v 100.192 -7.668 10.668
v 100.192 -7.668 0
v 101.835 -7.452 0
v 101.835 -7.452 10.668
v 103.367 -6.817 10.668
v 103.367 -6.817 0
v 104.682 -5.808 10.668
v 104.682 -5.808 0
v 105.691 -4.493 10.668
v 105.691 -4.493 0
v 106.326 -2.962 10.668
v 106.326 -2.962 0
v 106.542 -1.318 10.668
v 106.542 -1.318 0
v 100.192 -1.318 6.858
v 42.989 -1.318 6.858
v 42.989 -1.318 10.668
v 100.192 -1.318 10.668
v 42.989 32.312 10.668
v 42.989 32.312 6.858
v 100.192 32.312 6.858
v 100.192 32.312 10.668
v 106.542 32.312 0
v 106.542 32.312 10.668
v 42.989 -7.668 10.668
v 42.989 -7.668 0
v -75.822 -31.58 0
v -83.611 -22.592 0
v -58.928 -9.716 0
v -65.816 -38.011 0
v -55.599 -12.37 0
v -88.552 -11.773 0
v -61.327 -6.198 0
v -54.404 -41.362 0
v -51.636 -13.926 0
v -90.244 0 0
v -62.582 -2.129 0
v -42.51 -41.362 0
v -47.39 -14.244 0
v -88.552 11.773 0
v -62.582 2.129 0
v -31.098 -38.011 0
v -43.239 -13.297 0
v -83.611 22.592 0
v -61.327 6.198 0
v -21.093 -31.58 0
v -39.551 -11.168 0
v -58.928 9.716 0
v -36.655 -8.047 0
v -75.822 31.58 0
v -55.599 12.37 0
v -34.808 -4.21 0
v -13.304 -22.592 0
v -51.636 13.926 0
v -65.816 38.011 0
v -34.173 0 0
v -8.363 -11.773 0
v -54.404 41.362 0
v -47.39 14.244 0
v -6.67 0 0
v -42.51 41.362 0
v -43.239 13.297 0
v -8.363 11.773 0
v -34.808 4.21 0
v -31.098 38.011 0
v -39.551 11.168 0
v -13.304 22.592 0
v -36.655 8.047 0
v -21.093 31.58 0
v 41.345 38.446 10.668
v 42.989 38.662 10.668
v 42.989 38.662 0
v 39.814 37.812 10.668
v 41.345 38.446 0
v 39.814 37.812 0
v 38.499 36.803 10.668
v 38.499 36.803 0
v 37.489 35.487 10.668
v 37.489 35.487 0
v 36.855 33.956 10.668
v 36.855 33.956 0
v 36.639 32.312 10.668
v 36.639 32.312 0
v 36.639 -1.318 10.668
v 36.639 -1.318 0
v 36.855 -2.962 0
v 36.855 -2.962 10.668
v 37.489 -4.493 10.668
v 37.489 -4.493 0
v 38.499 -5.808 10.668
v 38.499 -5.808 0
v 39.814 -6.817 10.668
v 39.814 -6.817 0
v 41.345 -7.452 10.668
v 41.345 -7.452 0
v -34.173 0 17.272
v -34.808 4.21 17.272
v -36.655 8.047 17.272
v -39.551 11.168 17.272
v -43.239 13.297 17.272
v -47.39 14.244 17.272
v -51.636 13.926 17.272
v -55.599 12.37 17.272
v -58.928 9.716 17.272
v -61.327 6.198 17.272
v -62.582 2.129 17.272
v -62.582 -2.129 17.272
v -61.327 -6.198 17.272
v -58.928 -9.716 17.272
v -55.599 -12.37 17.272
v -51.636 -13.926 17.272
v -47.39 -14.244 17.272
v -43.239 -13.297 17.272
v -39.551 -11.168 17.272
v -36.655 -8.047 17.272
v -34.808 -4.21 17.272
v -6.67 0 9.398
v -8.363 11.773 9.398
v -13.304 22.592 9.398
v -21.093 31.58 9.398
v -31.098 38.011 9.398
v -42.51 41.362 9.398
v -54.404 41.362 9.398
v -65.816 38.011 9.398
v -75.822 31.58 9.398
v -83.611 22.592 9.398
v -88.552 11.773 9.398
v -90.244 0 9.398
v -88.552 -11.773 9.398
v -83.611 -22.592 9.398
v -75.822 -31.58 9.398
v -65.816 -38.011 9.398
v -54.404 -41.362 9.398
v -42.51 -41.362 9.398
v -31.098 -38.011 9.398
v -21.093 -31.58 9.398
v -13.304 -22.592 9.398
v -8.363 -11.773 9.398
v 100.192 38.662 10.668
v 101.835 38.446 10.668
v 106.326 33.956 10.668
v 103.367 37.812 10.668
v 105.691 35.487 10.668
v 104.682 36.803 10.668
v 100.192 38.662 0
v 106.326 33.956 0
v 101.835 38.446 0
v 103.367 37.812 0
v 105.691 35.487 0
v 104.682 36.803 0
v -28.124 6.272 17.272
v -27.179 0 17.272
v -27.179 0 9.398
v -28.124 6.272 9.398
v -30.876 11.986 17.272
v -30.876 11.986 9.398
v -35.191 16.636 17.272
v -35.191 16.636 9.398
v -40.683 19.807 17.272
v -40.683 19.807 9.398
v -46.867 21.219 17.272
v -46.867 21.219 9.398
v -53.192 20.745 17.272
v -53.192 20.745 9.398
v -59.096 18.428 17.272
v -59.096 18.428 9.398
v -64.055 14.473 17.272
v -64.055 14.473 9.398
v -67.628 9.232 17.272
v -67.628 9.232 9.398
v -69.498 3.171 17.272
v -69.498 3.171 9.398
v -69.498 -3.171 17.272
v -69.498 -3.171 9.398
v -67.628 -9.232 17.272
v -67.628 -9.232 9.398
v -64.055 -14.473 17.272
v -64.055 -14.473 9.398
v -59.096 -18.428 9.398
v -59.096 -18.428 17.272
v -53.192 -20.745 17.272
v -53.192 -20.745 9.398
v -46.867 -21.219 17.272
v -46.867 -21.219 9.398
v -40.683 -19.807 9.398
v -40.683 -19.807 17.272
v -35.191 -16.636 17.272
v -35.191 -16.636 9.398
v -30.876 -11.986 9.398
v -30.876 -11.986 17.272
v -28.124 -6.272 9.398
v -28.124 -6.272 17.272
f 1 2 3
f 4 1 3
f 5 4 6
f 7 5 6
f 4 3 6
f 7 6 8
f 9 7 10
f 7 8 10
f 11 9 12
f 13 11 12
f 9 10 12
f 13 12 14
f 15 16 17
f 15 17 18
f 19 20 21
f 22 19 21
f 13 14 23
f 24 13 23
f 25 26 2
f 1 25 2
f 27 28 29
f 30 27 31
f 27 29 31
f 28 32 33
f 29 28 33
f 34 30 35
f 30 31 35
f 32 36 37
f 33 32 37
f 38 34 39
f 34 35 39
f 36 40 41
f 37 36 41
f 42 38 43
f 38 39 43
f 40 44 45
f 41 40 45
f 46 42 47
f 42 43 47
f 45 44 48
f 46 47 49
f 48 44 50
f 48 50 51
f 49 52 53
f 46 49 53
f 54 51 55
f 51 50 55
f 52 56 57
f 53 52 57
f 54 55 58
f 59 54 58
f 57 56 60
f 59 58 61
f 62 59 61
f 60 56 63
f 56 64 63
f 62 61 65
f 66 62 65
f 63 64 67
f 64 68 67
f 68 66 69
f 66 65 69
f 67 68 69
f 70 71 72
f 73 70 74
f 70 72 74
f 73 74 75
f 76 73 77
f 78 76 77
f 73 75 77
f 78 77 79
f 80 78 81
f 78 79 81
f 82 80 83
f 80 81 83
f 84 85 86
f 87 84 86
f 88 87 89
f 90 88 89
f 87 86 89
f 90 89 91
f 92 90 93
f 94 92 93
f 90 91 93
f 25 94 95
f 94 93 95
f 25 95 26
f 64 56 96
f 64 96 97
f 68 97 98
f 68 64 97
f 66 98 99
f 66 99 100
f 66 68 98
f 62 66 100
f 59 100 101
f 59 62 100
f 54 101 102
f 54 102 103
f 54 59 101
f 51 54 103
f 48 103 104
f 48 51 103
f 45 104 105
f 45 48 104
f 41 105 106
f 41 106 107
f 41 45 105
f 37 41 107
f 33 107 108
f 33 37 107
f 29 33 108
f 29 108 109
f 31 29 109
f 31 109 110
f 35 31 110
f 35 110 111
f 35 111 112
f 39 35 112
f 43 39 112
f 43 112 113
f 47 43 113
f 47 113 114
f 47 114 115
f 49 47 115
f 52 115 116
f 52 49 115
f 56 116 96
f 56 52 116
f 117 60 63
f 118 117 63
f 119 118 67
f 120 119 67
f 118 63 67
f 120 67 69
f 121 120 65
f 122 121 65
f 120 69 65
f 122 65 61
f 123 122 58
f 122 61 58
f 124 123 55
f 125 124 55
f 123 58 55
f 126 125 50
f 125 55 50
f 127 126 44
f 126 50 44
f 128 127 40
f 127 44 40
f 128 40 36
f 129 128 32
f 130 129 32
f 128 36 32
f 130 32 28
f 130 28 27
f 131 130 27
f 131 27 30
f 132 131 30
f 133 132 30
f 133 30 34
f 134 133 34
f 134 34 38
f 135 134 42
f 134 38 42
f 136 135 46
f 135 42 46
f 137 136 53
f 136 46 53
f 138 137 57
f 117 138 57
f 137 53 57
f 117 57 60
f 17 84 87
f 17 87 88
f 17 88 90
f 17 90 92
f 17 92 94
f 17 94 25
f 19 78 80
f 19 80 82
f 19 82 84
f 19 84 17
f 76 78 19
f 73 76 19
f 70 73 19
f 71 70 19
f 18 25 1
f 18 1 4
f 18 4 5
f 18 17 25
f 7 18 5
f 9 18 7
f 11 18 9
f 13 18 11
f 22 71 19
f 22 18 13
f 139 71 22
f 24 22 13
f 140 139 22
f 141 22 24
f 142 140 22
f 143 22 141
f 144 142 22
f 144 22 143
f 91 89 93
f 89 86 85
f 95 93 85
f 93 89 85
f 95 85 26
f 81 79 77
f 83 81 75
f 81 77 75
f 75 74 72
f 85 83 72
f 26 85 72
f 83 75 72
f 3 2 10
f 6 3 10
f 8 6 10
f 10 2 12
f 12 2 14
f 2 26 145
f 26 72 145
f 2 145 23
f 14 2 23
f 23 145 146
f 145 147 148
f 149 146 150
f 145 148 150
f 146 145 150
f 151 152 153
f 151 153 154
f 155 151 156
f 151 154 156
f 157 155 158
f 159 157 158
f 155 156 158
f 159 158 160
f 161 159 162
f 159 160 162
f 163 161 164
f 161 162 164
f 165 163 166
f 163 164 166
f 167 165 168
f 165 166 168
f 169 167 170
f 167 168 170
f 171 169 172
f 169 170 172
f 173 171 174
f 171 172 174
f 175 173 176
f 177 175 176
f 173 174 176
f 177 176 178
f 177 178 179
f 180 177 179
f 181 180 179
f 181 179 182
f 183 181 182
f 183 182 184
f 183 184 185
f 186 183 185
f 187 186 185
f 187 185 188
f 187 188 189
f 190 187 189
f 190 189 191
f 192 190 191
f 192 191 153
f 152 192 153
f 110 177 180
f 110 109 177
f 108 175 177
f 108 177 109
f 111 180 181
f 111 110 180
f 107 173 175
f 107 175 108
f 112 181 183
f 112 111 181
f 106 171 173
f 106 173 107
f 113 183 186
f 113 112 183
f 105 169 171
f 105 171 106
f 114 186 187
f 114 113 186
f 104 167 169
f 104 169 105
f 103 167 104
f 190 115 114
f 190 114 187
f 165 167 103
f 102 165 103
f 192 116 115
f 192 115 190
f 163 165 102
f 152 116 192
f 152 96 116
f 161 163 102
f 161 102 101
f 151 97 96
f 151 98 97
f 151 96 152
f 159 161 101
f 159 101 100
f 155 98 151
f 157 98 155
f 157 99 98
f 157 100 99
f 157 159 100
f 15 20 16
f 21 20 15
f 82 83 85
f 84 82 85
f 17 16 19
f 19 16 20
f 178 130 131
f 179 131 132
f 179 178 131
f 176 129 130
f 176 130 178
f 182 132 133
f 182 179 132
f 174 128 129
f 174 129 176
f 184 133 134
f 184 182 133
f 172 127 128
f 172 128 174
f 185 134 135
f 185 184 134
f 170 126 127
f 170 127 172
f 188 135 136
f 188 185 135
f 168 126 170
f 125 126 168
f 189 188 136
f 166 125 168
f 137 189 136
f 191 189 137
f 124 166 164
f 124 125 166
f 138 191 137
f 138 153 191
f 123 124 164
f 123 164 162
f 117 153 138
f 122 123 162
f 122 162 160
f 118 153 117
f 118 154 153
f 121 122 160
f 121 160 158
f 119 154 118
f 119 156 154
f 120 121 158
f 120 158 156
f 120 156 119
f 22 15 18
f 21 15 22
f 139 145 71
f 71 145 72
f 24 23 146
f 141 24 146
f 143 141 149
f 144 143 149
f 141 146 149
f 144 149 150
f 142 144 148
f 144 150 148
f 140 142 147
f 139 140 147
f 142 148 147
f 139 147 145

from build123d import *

# Parameters (mm, degrees)
F0_R     = 41.78696
F0_R_2   = 21.278274
F1_DEPTH = 9.398
F0_R_3   = 14.284121
F2_DEPTH = 17.272
F3_W     = 57.203214
F3_H     = 33.630501
F4_DEPTH = 10.668
F5_DEPTH = 6.858


with BuildPart() as f1:
    # F0 (on Top) → F1 (new body)
    with BuildSketch(Plane.XY):
        with Locations((-48.457306, 0)):
            Circle(F0_R)
        with Locations((-48.457306, 0)):
            Circle(F0_R_2, mode=Mode.SUBTRACT)
    extrude(amount=F1_DEPTH)

    # F0 (on Top) → F2 (join)
    with BuildSketch(Plane.XY):
        with Locations((-48.457306, 0)):
            Circle(F0_R_2)
        with Locations((-48.457306, 0)):
            Circle(F0_R_3, mode=Mode.SUBTRACT)
    extrude(amount=F2_DEPTH)


with BuildPart() as f4:
    # F3 (on Top) → F4 (new body)
    with BuildSketch(Plane.XY):
        with BuildLine():
            Line((100.191902, 38.66243), (42.988688, 38.66243))
            ThreePointArc((42.988688, 38.66243), (38.49856, 36.802558), (36.638688, 32.31243))
            Line((36.638688, 32.31243), (36.638688, -1.318071))
            ThreePointArc((36.638688, -1.318071), (38.49856, -5.808199), (42.988688, -7.668071))
            Line((42.988688, -7.668071), (100.191902, -7.668071))
            ThreePointArc((100.191902, -7.668071), (104.68203, -5.808199), (106.541902, -1.318071))
            Line((106.541902, -1.318071), (106.541902, 32.31243))
            ThreePointArc((106.541902, 32.31243), (104.68203, 36.802558), (100.191902, 38.66243))
        make_face()
        with Locations((71.590295, 15.497179)):
            Rectangle(F3_W, F3_H, mode=Mode.SUBTRACT)
    extrude(amount=F4_DEPTH)

    # F3 (on Top) → F5 (join)
    with BuildSketch(Plane.XY):
        with BuildLine():
            Line((100.191902, 38.66243), (42.988688, 38.66243))
            ThreePointArc((42.988688, 38.66243), (38.49856, 36.802558), (36.638688, 32.31243))
            Line((36.638688, 32.31243), (36.638688, -1.318071))
            ThreePointArc((36.638688, -1.318071), (38.49856, -5.808199), (42.988688, -7.668071))
            Line((42.988688, -7.668071), (100.191902, -7.668071))
            ThreePointArc((100.191902, -7.668071), (104.68203, -5.808199), (106.541902, -1.318071))
            Line((106.541902, -1.318071), (106.541902, 32.31243))
            ThreePointArc((106.541902, 32.31243), (104.68203, 36.802558), (100.191902, 38.66243))
        make_face()
        with Locations((71.590295, 15.497179)):
            Rectangle(F3_W, F3_H, mode=Mode.SUBTRACT)
        with Locations((71.590295, 15.497179)):
            Rectangle(F3_W, F3_H)
    extrude(amount=F5_DEPTH)


solid = Compound([f1.part, f4.part])
